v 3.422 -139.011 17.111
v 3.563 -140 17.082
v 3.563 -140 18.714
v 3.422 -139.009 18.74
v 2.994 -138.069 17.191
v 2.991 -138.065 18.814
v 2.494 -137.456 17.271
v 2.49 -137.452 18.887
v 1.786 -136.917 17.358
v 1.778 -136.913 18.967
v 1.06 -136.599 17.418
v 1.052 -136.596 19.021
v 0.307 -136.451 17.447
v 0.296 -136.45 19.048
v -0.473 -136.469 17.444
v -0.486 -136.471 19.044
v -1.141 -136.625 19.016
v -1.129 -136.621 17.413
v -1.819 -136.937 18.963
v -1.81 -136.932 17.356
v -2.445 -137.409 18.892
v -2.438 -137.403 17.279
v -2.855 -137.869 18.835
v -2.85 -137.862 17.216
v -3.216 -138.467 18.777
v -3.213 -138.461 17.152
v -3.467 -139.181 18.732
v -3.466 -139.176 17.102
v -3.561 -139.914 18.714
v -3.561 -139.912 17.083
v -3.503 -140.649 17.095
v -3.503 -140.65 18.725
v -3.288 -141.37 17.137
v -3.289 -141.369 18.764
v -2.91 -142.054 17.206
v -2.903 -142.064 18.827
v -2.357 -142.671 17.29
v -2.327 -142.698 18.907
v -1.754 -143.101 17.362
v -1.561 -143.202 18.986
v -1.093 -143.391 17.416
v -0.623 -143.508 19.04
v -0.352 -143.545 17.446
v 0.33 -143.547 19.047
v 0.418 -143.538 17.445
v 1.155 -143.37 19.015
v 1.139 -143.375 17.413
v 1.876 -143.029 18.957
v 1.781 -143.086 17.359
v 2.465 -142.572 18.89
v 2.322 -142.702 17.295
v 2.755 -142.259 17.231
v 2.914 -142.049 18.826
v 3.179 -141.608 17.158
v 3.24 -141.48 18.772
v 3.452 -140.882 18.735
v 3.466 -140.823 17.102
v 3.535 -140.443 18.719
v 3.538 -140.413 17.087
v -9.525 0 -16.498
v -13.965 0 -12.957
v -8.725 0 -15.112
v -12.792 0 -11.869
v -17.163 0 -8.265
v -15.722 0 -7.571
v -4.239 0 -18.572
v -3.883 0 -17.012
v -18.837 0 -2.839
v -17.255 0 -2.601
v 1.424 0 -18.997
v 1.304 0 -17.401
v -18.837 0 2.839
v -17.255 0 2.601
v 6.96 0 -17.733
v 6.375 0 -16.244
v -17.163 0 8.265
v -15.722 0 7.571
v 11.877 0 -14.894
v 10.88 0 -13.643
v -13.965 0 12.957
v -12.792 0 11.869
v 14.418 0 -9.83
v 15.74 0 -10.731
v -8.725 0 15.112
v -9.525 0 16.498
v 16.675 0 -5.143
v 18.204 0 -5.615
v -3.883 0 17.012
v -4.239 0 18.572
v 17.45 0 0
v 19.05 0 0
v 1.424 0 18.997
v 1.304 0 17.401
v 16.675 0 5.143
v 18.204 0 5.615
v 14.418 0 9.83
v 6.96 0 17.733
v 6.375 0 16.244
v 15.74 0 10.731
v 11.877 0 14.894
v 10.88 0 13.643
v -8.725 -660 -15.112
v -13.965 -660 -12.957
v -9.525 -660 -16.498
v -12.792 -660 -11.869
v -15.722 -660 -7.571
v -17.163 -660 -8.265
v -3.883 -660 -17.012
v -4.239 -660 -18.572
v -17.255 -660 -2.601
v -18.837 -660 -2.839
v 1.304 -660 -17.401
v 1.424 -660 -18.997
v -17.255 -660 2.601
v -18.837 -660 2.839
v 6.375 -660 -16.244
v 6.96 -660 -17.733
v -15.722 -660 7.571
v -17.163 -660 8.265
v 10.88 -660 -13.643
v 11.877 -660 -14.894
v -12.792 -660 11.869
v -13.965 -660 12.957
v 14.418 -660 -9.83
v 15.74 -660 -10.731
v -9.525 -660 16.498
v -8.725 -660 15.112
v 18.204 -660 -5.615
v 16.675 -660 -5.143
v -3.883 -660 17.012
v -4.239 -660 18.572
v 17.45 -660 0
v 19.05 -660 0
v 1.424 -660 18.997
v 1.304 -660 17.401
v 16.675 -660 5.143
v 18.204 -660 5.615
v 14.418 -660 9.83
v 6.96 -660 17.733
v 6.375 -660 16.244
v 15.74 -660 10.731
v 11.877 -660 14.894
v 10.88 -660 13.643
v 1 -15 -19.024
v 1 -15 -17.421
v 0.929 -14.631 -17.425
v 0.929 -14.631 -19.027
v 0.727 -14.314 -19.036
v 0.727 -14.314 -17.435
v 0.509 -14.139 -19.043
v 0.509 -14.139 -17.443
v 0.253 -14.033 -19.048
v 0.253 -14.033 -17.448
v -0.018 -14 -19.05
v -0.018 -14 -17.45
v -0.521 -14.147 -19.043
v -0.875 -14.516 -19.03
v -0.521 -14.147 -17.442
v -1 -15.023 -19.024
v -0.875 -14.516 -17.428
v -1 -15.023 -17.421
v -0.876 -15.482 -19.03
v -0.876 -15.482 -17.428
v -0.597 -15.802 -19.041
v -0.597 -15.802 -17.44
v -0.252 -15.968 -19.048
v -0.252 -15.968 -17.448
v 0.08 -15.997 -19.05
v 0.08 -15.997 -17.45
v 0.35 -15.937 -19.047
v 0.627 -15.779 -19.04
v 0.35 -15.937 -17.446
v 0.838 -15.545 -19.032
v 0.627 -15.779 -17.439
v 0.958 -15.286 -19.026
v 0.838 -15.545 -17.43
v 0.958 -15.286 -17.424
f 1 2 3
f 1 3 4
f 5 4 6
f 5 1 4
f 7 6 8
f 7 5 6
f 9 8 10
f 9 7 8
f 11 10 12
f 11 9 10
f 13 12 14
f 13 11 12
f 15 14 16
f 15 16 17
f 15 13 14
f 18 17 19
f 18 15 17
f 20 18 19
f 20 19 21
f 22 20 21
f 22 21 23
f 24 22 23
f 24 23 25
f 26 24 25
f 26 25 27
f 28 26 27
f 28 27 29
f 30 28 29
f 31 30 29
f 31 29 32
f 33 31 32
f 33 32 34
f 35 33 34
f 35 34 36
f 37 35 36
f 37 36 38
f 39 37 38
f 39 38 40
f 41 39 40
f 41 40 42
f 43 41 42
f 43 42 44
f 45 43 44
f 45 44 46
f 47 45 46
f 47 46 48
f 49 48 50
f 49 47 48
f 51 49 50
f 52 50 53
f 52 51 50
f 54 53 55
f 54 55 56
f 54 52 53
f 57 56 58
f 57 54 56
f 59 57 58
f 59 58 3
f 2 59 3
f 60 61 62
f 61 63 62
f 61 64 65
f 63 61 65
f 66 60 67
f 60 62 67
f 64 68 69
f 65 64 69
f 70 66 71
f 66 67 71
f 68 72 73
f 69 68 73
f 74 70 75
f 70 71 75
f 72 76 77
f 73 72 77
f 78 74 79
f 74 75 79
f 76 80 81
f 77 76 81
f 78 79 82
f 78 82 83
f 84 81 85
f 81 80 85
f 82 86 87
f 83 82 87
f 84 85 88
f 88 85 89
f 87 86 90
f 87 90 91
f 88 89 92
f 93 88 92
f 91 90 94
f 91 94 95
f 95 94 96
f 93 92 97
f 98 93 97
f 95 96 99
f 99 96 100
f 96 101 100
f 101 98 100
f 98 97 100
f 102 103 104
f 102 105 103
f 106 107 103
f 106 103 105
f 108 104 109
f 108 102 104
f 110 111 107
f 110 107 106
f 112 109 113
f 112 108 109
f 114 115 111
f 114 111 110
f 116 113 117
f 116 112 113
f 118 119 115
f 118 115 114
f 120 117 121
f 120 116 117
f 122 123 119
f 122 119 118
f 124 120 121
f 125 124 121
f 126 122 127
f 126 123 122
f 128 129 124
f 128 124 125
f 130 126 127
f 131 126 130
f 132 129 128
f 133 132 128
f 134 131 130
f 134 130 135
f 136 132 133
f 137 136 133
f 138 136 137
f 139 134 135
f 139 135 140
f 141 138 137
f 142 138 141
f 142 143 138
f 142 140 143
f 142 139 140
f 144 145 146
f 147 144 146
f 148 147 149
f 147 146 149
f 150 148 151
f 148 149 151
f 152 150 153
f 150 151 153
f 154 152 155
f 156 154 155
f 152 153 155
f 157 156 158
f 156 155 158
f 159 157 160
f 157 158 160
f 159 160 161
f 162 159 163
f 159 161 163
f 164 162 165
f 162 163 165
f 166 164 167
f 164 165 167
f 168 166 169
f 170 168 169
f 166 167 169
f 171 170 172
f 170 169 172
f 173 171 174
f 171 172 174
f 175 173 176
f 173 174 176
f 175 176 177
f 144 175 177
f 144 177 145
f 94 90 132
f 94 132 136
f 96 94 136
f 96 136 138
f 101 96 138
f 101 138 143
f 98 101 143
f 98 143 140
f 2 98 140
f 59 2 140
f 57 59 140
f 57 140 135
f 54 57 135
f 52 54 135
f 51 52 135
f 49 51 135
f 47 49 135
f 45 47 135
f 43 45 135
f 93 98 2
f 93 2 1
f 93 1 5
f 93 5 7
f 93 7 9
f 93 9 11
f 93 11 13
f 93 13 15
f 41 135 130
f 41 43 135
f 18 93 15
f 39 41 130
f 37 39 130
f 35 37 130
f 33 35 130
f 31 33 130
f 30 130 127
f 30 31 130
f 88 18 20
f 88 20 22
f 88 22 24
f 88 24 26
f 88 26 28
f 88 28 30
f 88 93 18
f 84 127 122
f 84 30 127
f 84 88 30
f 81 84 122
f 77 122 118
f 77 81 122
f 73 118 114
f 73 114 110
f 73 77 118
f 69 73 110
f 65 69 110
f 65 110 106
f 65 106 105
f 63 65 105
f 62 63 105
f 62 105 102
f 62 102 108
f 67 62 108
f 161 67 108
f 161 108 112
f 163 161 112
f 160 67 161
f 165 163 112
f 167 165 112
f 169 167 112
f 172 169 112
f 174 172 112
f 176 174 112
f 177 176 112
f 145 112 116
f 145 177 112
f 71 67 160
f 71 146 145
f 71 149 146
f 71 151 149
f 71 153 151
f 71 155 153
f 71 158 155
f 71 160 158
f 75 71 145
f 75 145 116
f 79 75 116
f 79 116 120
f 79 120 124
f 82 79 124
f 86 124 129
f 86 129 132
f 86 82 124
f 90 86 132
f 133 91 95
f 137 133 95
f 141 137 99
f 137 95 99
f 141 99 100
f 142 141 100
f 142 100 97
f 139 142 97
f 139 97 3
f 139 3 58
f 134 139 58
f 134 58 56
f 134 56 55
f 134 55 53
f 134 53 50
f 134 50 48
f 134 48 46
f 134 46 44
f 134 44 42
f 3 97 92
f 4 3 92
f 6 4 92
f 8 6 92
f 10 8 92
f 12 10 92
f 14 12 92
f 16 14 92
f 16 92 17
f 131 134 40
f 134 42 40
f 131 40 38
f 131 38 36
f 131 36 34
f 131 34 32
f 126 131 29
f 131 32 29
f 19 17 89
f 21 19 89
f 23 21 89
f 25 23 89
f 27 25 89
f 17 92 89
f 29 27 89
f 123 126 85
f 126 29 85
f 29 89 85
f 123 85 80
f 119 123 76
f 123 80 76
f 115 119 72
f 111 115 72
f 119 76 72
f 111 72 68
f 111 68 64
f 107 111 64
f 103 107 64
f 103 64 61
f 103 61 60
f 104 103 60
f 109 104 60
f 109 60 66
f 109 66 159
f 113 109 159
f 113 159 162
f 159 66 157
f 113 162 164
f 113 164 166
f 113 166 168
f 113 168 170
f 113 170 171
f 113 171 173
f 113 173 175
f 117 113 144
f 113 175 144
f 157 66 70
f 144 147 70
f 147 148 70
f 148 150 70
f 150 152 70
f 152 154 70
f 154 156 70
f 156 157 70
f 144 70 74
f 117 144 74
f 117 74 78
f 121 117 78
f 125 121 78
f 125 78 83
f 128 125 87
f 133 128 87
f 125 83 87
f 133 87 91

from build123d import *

# Parameters (mm, degrees)
F0_R     = 19.05
F0_R_2   = 17.45
F1_DEPTH = 660
F2_R     = 3.5625283299
F3_DEPTH = 20.050000094
F4_R     = 1
F5_DEPTH = 20.050000107


with BuildPart() as f1:
    # F0 (on Front) → F1 (new body)
    with BuildSketch(Plane.XZ):
        Circle(F0_R)
        Circle(F0_R_2, mode=Mode.SUBTRACT)
    extrude(amount=F1_DEPTH)

    # F2 (on Top) → F3 (cut, up to face)
    with BuildSketch(Plane.XY):
        with Locations((0, -140)):
            Circle(F2_R)
    extrude(amount=F3_DEPTH, mode=Mode.SUBTRACT)

    # F4 (on Top) → F5 (cut, up to face)
    with BuildSketch(Plane.XY):
        with Locations((0, -15)):
            Circle(F4_R)
    extrude(amount=-F5_DEPTH, mode=Mode.SUBTRACT)


solid = f1.part
